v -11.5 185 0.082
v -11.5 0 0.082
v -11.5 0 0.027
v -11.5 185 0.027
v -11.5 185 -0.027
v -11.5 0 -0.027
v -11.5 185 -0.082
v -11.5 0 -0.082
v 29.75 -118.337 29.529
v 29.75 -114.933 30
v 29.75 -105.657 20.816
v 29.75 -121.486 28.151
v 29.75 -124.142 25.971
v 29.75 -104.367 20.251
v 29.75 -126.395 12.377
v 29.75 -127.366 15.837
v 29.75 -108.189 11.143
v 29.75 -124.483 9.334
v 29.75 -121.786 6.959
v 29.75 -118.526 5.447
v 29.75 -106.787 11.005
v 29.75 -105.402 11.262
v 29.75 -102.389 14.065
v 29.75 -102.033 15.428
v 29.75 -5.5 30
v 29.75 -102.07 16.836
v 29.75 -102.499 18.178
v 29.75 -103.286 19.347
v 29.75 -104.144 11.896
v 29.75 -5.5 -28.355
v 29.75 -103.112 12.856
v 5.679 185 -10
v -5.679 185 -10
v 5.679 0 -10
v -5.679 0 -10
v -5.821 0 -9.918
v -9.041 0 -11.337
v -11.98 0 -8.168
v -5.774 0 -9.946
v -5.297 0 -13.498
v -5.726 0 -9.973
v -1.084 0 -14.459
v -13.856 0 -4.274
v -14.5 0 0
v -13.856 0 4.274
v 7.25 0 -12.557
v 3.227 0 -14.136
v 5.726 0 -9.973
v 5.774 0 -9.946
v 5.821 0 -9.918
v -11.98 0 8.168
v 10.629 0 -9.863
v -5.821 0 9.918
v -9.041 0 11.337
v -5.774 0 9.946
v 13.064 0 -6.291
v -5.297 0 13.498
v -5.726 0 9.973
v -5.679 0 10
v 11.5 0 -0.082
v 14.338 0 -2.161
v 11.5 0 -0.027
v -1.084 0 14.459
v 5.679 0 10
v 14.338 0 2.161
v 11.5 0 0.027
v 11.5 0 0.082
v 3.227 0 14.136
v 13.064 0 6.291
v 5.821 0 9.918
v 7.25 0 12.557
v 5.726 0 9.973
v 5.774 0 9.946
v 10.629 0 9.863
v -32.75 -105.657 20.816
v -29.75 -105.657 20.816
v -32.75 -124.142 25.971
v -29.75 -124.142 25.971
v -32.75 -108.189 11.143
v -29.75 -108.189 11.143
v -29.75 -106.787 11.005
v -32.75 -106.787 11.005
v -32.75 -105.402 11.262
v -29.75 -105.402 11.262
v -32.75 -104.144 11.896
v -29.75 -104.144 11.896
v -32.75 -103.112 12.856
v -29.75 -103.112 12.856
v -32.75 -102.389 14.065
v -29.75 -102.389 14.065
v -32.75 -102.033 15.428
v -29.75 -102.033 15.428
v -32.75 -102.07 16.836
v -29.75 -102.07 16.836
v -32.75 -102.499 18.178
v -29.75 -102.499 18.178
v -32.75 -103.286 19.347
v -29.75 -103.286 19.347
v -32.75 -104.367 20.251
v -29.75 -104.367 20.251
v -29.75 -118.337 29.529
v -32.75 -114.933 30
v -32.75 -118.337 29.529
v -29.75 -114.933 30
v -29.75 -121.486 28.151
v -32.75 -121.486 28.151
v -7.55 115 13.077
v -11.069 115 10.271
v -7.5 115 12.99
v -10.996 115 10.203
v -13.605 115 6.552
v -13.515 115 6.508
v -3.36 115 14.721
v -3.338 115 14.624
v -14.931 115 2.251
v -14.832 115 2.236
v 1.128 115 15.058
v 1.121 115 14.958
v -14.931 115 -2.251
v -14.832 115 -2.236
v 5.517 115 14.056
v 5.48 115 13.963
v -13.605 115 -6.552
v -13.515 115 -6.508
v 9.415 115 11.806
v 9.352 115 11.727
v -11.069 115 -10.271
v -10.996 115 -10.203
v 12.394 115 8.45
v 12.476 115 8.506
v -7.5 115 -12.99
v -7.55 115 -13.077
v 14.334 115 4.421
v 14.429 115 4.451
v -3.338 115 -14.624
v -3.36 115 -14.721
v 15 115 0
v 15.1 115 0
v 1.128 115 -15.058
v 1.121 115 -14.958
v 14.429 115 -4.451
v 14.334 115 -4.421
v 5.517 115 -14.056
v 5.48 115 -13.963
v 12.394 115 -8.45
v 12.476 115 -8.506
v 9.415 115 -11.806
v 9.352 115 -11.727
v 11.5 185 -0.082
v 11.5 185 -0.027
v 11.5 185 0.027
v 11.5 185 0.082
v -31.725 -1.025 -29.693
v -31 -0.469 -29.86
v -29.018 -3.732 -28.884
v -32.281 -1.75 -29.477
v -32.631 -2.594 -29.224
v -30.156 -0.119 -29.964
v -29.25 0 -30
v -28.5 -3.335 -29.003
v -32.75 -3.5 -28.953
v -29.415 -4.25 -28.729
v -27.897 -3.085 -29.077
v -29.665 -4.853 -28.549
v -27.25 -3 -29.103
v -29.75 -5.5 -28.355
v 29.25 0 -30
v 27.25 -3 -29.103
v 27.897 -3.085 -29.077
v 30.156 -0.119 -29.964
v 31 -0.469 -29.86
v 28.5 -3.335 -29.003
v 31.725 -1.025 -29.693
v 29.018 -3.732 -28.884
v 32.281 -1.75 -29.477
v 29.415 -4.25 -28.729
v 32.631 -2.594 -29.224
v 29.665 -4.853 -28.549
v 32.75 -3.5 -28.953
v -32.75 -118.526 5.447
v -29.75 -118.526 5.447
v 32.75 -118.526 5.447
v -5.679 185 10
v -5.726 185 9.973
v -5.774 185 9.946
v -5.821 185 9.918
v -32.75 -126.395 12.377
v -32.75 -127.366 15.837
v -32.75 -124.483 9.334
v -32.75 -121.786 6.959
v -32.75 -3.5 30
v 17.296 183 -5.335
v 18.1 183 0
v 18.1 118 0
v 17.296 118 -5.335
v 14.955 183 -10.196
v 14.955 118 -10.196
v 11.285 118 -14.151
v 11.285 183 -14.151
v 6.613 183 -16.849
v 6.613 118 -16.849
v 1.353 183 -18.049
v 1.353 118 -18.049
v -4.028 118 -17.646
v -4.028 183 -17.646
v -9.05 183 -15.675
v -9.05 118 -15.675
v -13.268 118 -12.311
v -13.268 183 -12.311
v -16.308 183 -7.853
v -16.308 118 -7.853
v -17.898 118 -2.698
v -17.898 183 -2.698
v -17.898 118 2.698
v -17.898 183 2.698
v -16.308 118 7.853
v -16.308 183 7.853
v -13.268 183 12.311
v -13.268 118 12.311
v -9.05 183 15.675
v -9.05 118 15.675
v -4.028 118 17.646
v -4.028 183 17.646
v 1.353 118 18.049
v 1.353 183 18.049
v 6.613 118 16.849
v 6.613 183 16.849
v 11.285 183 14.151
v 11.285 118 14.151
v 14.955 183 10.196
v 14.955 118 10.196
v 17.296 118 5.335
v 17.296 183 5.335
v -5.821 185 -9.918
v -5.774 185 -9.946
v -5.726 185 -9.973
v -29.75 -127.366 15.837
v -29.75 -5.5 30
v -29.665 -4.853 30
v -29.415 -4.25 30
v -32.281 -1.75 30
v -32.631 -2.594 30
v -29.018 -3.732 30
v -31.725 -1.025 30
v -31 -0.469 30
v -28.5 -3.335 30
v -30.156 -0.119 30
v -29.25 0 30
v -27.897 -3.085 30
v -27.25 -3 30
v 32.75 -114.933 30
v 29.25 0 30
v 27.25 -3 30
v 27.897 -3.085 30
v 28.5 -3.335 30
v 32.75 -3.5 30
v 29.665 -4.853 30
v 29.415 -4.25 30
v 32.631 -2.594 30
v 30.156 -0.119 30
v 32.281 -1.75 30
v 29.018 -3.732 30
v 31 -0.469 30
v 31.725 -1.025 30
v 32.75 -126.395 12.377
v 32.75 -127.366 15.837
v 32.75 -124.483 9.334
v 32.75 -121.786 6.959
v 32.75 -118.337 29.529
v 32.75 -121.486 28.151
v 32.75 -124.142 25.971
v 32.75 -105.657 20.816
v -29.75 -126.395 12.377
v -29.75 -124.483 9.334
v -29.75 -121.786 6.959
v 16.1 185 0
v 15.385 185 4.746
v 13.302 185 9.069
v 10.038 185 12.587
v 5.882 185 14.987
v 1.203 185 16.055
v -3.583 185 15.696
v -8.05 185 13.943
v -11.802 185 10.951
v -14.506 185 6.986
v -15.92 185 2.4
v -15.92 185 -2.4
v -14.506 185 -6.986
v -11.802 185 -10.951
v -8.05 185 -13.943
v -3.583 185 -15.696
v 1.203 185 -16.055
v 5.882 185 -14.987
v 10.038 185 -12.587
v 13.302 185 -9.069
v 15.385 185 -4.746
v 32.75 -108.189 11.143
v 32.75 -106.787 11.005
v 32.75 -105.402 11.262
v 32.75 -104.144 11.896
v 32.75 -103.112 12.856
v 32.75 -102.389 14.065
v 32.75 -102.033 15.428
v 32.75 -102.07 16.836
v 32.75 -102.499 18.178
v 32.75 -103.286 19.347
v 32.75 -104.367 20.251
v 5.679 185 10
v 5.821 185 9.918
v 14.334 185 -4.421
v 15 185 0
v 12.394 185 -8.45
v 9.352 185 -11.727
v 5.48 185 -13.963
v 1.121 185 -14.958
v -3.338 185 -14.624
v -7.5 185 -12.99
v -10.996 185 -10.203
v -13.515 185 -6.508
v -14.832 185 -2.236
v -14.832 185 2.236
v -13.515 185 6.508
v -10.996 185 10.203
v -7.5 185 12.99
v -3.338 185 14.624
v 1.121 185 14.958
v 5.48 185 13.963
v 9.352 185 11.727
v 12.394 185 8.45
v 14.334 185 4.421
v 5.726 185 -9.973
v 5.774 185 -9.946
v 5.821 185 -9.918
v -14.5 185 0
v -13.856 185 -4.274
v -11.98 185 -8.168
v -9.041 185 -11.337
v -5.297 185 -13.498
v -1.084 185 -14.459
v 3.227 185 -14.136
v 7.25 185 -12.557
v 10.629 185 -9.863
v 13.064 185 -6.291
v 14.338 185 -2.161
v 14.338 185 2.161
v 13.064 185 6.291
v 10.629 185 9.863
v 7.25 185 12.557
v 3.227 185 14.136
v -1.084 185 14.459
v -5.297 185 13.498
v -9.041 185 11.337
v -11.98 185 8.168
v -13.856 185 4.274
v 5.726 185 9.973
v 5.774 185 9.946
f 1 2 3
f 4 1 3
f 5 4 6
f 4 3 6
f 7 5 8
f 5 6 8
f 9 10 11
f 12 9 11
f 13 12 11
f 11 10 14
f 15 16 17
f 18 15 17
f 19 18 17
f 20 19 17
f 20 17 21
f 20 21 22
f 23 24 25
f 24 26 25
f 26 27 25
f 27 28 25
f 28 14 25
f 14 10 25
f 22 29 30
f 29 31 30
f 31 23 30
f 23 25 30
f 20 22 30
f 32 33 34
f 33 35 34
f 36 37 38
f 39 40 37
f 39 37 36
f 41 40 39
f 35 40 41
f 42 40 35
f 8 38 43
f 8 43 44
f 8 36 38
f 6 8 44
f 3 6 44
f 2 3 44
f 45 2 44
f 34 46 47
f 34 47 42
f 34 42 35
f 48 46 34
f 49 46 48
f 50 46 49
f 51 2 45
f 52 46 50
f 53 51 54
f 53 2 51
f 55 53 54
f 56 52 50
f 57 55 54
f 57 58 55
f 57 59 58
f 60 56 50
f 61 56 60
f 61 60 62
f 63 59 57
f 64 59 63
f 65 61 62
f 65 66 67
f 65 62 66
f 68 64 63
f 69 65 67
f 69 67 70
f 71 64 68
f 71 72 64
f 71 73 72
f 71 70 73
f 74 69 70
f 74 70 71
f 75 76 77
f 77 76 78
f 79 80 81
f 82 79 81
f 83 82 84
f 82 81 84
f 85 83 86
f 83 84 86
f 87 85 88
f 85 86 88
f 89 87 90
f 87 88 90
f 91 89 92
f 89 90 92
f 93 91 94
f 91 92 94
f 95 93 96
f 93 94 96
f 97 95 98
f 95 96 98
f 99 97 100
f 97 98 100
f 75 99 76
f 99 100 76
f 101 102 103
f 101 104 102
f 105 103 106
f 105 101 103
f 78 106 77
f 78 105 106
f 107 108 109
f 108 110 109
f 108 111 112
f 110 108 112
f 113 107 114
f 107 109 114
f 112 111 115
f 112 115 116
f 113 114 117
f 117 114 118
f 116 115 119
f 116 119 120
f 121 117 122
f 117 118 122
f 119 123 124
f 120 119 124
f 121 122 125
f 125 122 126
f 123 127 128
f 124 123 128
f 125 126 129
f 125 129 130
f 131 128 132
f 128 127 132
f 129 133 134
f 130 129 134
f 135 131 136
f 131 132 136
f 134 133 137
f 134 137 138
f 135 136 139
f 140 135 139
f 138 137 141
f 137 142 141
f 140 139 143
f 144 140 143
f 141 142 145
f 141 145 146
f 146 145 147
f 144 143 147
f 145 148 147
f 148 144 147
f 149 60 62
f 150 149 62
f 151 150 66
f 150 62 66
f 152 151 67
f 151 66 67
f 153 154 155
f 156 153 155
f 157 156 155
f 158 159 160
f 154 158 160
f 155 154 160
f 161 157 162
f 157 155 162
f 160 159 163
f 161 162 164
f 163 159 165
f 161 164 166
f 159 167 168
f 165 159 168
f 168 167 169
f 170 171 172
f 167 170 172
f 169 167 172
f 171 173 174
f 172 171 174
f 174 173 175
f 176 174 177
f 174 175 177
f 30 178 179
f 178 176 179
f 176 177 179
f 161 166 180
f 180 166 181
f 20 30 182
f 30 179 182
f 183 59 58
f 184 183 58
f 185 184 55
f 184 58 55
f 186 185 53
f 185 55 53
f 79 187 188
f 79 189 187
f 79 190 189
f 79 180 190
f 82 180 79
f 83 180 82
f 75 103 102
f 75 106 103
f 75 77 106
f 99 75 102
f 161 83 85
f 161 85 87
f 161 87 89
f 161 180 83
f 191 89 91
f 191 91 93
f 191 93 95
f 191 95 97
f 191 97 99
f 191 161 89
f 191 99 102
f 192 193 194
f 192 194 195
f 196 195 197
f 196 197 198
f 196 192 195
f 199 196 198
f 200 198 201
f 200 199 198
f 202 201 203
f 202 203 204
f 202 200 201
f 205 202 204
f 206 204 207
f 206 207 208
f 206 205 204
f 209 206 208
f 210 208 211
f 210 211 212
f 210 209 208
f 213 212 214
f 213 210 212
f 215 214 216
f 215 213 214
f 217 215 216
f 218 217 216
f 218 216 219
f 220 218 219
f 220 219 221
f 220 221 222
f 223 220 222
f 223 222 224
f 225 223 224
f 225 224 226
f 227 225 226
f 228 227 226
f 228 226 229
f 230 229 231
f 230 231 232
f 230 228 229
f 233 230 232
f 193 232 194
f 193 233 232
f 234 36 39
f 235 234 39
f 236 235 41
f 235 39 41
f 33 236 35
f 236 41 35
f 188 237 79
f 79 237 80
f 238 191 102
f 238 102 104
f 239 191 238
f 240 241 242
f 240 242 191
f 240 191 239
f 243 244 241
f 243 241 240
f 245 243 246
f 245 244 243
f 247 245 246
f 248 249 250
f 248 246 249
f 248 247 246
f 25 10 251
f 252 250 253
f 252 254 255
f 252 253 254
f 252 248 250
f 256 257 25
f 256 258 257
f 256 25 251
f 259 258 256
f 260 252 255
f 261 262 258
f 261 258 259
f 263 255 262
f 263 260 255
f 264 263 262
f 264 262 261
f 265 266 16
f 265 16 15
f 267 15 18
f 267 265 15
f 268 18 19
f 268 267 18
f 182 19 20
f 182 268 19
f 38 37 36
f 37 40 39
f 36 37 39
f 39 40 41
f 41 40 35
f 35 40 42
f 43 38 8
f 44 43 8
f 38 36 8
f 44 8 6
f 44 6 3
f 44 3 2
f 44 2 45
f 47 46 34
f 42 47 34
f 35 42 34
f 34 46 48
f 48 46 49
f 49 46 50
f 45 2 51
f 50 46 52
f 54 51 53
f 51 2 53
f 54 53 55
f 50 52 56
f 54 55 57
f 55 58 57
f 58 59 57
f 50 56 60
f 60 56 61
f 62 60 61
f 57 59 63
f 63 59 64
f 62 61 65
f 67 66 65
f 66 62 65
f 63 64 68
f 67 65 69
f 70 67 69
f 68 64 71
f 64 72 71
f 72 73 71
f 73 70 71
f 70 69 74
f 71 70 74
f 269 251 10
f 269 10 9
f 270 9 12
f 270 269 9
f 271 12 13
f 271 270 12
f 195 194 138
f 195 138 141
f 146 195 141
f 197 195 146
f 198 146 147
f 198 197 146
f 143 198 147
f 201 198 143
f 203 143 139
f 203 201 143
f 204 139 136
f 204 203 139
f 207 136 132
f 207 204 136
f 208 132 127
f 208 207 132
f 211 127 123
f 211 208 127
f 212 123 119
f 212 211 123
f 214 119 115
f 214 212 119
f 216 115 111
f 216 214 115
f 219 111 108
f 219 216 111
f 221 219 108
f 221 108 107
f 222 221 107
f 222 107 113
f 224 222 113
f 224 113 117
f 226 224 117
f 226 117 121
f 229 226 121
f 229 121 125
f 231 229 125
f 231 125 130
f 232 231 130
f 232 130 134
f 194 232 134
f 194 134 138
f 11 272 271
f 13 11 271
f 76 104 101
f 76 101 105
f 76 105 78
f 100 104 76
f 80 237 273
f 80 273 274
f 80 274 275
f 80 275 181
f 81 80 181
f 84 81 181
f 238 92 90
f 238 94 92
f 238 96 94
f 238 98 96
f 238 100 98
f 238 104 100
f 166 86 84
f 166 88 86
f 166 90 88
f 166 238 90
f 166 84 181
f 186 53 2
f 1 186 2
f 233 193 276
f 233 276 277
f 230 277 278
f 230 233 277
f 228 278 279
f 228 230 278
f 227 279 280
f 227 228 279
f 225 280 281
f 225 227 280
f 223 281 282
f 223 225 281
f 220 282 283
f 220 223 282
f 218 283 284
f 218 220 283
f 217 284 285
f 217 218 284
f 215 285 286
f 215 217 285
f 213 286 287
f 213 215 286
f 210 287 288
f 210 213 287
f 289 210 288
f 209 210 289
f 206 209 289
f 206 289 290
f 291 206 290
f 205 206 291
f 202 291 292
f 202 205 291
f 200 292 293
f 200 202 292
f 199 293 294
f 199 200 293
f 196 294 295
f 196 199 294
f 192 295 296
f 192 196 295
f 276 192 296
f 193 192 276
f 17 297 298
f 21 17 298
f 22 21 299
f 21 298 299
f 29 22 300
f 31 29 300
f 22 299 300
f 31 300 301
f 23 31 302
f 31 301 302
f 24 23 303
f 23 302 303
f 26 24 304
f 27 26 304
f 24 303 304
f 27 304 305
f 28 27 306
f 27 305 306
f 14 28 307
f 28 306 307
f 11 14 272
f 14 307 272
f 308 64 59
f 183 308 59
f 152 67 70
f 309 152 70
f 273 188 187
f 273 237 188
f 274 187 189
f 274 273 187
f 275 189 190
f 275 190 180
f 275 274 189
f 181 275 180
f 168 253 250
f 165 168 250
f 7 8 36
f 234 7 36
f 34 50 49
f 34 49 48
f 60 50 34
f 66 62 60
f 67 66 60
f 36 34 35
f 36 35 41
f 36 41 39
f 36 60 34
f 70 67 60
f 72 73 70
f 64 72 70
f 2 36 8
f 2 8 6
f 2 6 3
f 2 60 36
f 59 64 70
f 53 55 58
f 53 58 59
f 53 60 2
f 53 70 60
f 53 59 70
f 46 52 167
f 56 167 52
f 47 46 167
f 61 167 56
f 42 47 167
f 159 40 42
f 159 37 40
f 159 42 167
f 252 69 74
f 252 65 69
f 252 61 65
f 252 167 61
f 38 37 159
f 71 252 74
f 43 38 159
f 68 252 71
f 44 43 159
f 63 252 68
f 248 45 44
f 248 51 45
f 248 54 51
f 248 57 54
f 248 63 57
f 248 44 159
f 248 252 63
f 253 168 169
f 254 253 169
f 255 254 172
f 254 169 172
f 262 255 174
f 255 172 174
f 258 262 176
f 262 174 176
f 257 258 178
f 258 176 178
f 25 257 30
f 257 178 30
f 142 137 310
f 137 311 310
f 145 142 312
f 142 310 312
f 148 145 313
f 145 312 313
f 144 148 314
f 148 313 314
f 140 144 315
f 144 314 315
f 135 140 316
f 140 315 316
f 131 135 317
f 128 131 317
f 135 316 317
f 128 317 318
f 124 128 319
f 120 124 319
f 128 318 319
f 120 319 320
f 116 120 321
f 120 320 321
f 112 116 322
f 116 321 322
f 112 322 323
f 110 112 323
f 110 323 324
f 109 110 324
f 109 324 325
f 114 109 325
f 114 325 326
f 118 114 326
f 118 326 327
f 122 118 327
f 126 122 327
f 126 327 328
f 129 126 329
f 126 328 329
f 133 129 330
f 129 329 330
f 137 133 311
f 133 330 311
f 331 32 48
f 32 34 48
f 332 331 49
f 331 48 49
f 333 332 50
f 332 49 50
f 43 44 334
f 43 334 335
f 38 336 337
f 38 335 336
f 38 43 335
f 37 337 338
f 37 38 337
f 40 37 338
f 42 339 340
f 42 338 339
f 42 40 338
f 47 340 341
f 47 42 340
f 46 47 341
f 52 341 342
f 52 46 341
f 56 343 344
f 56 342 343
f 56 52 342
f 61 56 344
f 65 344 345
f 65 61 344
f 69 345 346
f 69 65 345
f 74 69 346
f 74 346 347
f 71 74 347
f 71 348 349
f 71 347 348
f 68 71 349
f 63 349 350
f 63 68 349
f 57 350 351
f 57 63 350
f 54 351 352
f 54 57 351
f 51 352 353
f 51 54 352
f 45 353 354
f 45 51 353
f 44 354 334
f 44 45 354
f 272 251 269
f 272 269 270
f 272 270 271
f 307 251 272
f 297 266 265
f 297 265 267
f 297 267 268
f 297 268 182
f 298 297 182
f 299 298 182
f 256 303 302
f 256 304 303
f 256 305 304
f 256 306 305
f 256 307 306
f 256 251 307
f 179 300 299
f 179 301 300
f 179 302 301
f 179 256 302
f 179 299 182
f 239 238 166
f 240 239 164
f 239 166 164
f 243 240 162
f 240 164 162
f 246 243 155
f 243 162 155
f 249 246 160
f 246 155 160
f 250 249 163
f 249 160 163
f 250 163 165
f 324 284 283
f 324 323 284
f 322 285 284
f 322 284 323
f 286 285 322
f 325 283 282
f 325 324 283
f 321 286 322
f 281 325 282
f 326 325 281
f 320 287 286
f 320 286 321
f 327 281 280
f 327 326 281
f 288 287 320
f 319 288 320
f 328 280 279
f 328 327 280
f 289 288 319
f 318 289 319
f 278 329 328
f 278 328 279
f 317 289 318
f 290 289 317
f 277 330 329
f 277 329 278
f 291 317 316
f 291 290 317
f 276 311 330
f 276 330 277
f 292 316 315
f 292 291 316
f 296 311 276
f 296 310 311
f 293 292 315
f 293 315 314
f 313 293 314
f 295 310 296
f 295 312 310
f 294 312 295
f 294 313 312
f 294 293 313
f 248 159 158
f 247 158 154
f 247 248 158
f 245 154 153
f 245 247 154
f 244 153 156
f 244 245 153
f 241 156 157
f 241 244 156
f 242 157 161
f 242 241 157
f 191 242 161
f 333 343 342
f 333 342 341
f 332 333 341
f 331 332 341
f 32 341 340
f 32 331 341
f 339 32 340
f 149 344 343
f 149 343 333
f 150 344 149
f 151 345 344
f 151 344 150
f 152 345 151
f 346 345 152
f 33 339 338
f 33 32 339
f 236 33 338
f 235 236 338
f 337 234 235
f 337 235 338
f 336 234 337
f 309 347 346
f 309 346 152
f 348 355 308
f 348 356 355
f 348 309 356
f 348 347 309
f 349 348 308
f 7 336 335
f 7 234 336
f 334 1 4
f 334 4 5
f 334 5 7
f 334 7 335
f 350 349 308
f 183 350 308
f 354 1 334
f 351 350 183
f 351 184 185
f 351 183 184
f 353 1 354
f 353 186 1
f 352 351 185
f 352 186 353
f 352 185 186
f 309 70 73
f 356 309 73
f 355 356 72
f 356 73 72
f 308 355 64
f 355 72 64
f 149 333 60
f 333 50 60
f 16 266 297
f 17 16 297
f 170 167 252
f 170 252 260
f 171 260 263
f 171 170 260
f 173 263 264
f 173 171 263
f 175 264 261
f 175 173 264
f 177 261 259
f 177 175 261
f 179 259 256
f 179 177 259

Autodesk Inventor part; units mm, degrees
ref_plane "YZ Plane" through (0, 0, 0) normal (1, 0, 0) x (0, 1, 0)
ref_plane "XZ Plane" through (0, 0, 0) normal (0, 1, 0) x (-1, 0, 0)
ref_plane "XY Plane" through (0, 0, 0) normal (0, 0, 1) x (1, 0, 0)
sketch "Sketch1" plane through (0, 0, 0) normal (0, 1, 0) x (-1, 0, 0)
  line L0 (32.75, 30) -> (-32.75, 30)
  line L1 (-32.75, 30) -> (-32.75, -30)
  line L2 (-32.75, -30) -> (32.75, -30)
  line L3 (32.75, -30) -> (32.75, 30)
  line L4 (32.75, 30) -> (-32.75, -30) construction
  line L5 (-32.75, 30) -> (32.75, -30) construction
  line L6 (-5.7735, -10) -> (-11.547, 0)
  line L7 (-11.547, 0) -> (-5.7735, 10)
  line L8 (-5.7735, 10) -> (5.7735, 10)
  line L9 (5.7735, 10) -> (11.547, 0)
  line L10 (11.547, 0) -> (5.7735, -10)
  line L11 (5.7735, -10) -> (-5.7735, -10)
  circle A0 centre (0, 0) radius 14.5
  circle A1 centre (0, 0) radius 11.5
  point P0 (0, 10)
  point P1 (11.4997, -0.0819)
  point P2 (5.8208, -9.9181)
  point P3 (5.6789, -10)
  point P4 (-5.6789, -10)
  point P5 (-5.8208, -9.9181)
  point P6 (-11.4997, -0.0819)
  point P7 (-11.4997, 0.0819)
  point P8 (-5.8208, 9.9181)
  point P9 (-5.6789, 10)
  point P10 (5.6789, 10)
  point P11 (5.8208, 9.9181)
  point P12 (11.4997, 0.0819)
  dimension "d1" = 65.5
  dimension "d2" = 60
  dimension "d3" = 20
  dimension "d31" = 29
  dimension "d32" = 3
extrude "Extrusion1" add sketch "Sketch1" against normal blind 3 contours L3 L2 L1 L0 | L6 A1 L11 | A1 L6 | L6 A1 L7 L8 L9 L10 L11 | L11 A1 | L6 L7 A1 | A1 L10 L11 | A1 L7 | L10 A1 | L7 L8 A1 | A1 L9 L10 | A1 L8 | L8 L9 A1 | L9 A1 | A0
ref_plane "Work Plane1" through (0, -3, 0) normal (0, -1, 0) x (1, 0, 0)
sketch "Sketch3" plane through (0, -3, 0) normal (0, -1, 0) x (1, 0, 0)
  line L0 (32.75, -30) -> (32.75, 30) projected
  line L1 (32.75, 30) -> (-32.75, 30) projected
  line L2 (-32.75, 30) -> (-32.75, -30) projected
  line L3 (-32.75, -30) -> (32.75, -30) projected
  line L4 (29.75, 30) -> (29.75, -30)
  line L5 (0, 0) -> (0, -7) construction
  line L6 (-29.75, 30) -> (-29.75, -30)
  dimension "d13" = 3
extrude "Extrusion4" add sketch "Sketch3" along normal blind 127 contours L3 L4 L1 L0 | L3 L2 L1 L6
sketch "Sketch4" plane through (32.75, 0, 30) normal (1, 0, 0) x (0, 0, -1)
  line L0 (0, 0) -> (60, 0) projected
  line L1 (0, 0) -> (0, -130) projected
  line L2 (60, -130) -> (0, -130) projected
  line L3 (60, 0) -> (60, -130) projected
  line L4 (0, 0) -> (60, 0) projected
  line L5 (60, 0) -> (21.1215, -130)
  arc A0 (18.8567, -108.1886) -> (9.1837, -105.6571) centre (14, -107) ccw
  line L6 (14, -107) -> (28, -107) construction
  line L7 (0, 0) -> (0, -130) projected
  line L8 (9.1837, -105.6571) -> (2, -131.4205)
  line L9 (2, -131.4205) -> (12.5394, -134)
  line L10 (12.5394, -134) -> (18.8567, -108.1886)
  arc A1 (0, -114.9326) -> (24.5531, -118.5255) centre (12.5394, -114.9326) ccw
  point P0 (30, 0)
  point P1 (14.163, -127.3665)
  point P2 (4.0294, -124.1422)
  point P3 (2.3961, -130)
  point P4 (13.5184, -130)
  dimension "d16" = 130
  dimension "d18" = 10
  dimension "d19" = 107
  dimension "d20" = 14
  dimension "d23" = 14
extrude "Extrusion5" cut sketch "Sketch4" against normal blind 127 contours L3 L2 L5 | A1 L8 L2 L1 | L5 L2 L10 A1 | A1 L10 L2 L8 | L8 A0 L10 A1 | L2 L10 L9 L8
extrude "Extrusion6" add sketch "Sketch1" along normal blind 185 contours L6 A1 L11 | A1 L6 | L11 A1 | L6 L7 A1 | A1 L10 L11 | A1 L7 | L10 A1 | L7 L8 A1 | A1 L9 L10 | A1 L8 | L8 L9 A1 | L9 A1 | A0
sketch "Sketch5" plane through (0, 185, 0) normal (0, 1, 0) x (1, 0, 0)
  circle A0 centre (0, 0) radius 15
  circle A1 centre (0, 0) radius 18.1
  circle A2 centre (0, 0) radius 14.5 projected
  dimension "d35" = 36.2
  dimension "d36" = 0.5
extrude "Extrusion7" add sketch "Sketch5" against normal blind 70 contours A1
chamfer "Chamfer1" distance 2 angle 45 1 edges at (-18.1, 185, 0)
chamfer "Chamfer2" distance 3 angle 45 1 edges at (-18.1, 115, 0)
fillet "Fillet1" radius 2.5 2 edges at (-29.75, -3, 0.4486) (29.75, -3, 0.4486)
fillet "Fillet2" radius 3.5 2 edges at (-32.75, 0, 0) (32.75, 0, 0)
ref_plane "Work Plane2" through (32.75, 0, 30) normal (0, 1, 0) x (0, 0, -1)
split body "Split1" result two bodies by plane through (32.75, 0, 30) normal (0, 1, 0) first body at (-13.8187, 123.3333, -2.2458) (17.5429, 139.6667, 1.4162)
thread "Thread4" size "M30x3.5" class "6g" standard "ANSI Metric M Profile" length 25
equation "\"d23\" = d20"
properties part number "frontwheelFork"
